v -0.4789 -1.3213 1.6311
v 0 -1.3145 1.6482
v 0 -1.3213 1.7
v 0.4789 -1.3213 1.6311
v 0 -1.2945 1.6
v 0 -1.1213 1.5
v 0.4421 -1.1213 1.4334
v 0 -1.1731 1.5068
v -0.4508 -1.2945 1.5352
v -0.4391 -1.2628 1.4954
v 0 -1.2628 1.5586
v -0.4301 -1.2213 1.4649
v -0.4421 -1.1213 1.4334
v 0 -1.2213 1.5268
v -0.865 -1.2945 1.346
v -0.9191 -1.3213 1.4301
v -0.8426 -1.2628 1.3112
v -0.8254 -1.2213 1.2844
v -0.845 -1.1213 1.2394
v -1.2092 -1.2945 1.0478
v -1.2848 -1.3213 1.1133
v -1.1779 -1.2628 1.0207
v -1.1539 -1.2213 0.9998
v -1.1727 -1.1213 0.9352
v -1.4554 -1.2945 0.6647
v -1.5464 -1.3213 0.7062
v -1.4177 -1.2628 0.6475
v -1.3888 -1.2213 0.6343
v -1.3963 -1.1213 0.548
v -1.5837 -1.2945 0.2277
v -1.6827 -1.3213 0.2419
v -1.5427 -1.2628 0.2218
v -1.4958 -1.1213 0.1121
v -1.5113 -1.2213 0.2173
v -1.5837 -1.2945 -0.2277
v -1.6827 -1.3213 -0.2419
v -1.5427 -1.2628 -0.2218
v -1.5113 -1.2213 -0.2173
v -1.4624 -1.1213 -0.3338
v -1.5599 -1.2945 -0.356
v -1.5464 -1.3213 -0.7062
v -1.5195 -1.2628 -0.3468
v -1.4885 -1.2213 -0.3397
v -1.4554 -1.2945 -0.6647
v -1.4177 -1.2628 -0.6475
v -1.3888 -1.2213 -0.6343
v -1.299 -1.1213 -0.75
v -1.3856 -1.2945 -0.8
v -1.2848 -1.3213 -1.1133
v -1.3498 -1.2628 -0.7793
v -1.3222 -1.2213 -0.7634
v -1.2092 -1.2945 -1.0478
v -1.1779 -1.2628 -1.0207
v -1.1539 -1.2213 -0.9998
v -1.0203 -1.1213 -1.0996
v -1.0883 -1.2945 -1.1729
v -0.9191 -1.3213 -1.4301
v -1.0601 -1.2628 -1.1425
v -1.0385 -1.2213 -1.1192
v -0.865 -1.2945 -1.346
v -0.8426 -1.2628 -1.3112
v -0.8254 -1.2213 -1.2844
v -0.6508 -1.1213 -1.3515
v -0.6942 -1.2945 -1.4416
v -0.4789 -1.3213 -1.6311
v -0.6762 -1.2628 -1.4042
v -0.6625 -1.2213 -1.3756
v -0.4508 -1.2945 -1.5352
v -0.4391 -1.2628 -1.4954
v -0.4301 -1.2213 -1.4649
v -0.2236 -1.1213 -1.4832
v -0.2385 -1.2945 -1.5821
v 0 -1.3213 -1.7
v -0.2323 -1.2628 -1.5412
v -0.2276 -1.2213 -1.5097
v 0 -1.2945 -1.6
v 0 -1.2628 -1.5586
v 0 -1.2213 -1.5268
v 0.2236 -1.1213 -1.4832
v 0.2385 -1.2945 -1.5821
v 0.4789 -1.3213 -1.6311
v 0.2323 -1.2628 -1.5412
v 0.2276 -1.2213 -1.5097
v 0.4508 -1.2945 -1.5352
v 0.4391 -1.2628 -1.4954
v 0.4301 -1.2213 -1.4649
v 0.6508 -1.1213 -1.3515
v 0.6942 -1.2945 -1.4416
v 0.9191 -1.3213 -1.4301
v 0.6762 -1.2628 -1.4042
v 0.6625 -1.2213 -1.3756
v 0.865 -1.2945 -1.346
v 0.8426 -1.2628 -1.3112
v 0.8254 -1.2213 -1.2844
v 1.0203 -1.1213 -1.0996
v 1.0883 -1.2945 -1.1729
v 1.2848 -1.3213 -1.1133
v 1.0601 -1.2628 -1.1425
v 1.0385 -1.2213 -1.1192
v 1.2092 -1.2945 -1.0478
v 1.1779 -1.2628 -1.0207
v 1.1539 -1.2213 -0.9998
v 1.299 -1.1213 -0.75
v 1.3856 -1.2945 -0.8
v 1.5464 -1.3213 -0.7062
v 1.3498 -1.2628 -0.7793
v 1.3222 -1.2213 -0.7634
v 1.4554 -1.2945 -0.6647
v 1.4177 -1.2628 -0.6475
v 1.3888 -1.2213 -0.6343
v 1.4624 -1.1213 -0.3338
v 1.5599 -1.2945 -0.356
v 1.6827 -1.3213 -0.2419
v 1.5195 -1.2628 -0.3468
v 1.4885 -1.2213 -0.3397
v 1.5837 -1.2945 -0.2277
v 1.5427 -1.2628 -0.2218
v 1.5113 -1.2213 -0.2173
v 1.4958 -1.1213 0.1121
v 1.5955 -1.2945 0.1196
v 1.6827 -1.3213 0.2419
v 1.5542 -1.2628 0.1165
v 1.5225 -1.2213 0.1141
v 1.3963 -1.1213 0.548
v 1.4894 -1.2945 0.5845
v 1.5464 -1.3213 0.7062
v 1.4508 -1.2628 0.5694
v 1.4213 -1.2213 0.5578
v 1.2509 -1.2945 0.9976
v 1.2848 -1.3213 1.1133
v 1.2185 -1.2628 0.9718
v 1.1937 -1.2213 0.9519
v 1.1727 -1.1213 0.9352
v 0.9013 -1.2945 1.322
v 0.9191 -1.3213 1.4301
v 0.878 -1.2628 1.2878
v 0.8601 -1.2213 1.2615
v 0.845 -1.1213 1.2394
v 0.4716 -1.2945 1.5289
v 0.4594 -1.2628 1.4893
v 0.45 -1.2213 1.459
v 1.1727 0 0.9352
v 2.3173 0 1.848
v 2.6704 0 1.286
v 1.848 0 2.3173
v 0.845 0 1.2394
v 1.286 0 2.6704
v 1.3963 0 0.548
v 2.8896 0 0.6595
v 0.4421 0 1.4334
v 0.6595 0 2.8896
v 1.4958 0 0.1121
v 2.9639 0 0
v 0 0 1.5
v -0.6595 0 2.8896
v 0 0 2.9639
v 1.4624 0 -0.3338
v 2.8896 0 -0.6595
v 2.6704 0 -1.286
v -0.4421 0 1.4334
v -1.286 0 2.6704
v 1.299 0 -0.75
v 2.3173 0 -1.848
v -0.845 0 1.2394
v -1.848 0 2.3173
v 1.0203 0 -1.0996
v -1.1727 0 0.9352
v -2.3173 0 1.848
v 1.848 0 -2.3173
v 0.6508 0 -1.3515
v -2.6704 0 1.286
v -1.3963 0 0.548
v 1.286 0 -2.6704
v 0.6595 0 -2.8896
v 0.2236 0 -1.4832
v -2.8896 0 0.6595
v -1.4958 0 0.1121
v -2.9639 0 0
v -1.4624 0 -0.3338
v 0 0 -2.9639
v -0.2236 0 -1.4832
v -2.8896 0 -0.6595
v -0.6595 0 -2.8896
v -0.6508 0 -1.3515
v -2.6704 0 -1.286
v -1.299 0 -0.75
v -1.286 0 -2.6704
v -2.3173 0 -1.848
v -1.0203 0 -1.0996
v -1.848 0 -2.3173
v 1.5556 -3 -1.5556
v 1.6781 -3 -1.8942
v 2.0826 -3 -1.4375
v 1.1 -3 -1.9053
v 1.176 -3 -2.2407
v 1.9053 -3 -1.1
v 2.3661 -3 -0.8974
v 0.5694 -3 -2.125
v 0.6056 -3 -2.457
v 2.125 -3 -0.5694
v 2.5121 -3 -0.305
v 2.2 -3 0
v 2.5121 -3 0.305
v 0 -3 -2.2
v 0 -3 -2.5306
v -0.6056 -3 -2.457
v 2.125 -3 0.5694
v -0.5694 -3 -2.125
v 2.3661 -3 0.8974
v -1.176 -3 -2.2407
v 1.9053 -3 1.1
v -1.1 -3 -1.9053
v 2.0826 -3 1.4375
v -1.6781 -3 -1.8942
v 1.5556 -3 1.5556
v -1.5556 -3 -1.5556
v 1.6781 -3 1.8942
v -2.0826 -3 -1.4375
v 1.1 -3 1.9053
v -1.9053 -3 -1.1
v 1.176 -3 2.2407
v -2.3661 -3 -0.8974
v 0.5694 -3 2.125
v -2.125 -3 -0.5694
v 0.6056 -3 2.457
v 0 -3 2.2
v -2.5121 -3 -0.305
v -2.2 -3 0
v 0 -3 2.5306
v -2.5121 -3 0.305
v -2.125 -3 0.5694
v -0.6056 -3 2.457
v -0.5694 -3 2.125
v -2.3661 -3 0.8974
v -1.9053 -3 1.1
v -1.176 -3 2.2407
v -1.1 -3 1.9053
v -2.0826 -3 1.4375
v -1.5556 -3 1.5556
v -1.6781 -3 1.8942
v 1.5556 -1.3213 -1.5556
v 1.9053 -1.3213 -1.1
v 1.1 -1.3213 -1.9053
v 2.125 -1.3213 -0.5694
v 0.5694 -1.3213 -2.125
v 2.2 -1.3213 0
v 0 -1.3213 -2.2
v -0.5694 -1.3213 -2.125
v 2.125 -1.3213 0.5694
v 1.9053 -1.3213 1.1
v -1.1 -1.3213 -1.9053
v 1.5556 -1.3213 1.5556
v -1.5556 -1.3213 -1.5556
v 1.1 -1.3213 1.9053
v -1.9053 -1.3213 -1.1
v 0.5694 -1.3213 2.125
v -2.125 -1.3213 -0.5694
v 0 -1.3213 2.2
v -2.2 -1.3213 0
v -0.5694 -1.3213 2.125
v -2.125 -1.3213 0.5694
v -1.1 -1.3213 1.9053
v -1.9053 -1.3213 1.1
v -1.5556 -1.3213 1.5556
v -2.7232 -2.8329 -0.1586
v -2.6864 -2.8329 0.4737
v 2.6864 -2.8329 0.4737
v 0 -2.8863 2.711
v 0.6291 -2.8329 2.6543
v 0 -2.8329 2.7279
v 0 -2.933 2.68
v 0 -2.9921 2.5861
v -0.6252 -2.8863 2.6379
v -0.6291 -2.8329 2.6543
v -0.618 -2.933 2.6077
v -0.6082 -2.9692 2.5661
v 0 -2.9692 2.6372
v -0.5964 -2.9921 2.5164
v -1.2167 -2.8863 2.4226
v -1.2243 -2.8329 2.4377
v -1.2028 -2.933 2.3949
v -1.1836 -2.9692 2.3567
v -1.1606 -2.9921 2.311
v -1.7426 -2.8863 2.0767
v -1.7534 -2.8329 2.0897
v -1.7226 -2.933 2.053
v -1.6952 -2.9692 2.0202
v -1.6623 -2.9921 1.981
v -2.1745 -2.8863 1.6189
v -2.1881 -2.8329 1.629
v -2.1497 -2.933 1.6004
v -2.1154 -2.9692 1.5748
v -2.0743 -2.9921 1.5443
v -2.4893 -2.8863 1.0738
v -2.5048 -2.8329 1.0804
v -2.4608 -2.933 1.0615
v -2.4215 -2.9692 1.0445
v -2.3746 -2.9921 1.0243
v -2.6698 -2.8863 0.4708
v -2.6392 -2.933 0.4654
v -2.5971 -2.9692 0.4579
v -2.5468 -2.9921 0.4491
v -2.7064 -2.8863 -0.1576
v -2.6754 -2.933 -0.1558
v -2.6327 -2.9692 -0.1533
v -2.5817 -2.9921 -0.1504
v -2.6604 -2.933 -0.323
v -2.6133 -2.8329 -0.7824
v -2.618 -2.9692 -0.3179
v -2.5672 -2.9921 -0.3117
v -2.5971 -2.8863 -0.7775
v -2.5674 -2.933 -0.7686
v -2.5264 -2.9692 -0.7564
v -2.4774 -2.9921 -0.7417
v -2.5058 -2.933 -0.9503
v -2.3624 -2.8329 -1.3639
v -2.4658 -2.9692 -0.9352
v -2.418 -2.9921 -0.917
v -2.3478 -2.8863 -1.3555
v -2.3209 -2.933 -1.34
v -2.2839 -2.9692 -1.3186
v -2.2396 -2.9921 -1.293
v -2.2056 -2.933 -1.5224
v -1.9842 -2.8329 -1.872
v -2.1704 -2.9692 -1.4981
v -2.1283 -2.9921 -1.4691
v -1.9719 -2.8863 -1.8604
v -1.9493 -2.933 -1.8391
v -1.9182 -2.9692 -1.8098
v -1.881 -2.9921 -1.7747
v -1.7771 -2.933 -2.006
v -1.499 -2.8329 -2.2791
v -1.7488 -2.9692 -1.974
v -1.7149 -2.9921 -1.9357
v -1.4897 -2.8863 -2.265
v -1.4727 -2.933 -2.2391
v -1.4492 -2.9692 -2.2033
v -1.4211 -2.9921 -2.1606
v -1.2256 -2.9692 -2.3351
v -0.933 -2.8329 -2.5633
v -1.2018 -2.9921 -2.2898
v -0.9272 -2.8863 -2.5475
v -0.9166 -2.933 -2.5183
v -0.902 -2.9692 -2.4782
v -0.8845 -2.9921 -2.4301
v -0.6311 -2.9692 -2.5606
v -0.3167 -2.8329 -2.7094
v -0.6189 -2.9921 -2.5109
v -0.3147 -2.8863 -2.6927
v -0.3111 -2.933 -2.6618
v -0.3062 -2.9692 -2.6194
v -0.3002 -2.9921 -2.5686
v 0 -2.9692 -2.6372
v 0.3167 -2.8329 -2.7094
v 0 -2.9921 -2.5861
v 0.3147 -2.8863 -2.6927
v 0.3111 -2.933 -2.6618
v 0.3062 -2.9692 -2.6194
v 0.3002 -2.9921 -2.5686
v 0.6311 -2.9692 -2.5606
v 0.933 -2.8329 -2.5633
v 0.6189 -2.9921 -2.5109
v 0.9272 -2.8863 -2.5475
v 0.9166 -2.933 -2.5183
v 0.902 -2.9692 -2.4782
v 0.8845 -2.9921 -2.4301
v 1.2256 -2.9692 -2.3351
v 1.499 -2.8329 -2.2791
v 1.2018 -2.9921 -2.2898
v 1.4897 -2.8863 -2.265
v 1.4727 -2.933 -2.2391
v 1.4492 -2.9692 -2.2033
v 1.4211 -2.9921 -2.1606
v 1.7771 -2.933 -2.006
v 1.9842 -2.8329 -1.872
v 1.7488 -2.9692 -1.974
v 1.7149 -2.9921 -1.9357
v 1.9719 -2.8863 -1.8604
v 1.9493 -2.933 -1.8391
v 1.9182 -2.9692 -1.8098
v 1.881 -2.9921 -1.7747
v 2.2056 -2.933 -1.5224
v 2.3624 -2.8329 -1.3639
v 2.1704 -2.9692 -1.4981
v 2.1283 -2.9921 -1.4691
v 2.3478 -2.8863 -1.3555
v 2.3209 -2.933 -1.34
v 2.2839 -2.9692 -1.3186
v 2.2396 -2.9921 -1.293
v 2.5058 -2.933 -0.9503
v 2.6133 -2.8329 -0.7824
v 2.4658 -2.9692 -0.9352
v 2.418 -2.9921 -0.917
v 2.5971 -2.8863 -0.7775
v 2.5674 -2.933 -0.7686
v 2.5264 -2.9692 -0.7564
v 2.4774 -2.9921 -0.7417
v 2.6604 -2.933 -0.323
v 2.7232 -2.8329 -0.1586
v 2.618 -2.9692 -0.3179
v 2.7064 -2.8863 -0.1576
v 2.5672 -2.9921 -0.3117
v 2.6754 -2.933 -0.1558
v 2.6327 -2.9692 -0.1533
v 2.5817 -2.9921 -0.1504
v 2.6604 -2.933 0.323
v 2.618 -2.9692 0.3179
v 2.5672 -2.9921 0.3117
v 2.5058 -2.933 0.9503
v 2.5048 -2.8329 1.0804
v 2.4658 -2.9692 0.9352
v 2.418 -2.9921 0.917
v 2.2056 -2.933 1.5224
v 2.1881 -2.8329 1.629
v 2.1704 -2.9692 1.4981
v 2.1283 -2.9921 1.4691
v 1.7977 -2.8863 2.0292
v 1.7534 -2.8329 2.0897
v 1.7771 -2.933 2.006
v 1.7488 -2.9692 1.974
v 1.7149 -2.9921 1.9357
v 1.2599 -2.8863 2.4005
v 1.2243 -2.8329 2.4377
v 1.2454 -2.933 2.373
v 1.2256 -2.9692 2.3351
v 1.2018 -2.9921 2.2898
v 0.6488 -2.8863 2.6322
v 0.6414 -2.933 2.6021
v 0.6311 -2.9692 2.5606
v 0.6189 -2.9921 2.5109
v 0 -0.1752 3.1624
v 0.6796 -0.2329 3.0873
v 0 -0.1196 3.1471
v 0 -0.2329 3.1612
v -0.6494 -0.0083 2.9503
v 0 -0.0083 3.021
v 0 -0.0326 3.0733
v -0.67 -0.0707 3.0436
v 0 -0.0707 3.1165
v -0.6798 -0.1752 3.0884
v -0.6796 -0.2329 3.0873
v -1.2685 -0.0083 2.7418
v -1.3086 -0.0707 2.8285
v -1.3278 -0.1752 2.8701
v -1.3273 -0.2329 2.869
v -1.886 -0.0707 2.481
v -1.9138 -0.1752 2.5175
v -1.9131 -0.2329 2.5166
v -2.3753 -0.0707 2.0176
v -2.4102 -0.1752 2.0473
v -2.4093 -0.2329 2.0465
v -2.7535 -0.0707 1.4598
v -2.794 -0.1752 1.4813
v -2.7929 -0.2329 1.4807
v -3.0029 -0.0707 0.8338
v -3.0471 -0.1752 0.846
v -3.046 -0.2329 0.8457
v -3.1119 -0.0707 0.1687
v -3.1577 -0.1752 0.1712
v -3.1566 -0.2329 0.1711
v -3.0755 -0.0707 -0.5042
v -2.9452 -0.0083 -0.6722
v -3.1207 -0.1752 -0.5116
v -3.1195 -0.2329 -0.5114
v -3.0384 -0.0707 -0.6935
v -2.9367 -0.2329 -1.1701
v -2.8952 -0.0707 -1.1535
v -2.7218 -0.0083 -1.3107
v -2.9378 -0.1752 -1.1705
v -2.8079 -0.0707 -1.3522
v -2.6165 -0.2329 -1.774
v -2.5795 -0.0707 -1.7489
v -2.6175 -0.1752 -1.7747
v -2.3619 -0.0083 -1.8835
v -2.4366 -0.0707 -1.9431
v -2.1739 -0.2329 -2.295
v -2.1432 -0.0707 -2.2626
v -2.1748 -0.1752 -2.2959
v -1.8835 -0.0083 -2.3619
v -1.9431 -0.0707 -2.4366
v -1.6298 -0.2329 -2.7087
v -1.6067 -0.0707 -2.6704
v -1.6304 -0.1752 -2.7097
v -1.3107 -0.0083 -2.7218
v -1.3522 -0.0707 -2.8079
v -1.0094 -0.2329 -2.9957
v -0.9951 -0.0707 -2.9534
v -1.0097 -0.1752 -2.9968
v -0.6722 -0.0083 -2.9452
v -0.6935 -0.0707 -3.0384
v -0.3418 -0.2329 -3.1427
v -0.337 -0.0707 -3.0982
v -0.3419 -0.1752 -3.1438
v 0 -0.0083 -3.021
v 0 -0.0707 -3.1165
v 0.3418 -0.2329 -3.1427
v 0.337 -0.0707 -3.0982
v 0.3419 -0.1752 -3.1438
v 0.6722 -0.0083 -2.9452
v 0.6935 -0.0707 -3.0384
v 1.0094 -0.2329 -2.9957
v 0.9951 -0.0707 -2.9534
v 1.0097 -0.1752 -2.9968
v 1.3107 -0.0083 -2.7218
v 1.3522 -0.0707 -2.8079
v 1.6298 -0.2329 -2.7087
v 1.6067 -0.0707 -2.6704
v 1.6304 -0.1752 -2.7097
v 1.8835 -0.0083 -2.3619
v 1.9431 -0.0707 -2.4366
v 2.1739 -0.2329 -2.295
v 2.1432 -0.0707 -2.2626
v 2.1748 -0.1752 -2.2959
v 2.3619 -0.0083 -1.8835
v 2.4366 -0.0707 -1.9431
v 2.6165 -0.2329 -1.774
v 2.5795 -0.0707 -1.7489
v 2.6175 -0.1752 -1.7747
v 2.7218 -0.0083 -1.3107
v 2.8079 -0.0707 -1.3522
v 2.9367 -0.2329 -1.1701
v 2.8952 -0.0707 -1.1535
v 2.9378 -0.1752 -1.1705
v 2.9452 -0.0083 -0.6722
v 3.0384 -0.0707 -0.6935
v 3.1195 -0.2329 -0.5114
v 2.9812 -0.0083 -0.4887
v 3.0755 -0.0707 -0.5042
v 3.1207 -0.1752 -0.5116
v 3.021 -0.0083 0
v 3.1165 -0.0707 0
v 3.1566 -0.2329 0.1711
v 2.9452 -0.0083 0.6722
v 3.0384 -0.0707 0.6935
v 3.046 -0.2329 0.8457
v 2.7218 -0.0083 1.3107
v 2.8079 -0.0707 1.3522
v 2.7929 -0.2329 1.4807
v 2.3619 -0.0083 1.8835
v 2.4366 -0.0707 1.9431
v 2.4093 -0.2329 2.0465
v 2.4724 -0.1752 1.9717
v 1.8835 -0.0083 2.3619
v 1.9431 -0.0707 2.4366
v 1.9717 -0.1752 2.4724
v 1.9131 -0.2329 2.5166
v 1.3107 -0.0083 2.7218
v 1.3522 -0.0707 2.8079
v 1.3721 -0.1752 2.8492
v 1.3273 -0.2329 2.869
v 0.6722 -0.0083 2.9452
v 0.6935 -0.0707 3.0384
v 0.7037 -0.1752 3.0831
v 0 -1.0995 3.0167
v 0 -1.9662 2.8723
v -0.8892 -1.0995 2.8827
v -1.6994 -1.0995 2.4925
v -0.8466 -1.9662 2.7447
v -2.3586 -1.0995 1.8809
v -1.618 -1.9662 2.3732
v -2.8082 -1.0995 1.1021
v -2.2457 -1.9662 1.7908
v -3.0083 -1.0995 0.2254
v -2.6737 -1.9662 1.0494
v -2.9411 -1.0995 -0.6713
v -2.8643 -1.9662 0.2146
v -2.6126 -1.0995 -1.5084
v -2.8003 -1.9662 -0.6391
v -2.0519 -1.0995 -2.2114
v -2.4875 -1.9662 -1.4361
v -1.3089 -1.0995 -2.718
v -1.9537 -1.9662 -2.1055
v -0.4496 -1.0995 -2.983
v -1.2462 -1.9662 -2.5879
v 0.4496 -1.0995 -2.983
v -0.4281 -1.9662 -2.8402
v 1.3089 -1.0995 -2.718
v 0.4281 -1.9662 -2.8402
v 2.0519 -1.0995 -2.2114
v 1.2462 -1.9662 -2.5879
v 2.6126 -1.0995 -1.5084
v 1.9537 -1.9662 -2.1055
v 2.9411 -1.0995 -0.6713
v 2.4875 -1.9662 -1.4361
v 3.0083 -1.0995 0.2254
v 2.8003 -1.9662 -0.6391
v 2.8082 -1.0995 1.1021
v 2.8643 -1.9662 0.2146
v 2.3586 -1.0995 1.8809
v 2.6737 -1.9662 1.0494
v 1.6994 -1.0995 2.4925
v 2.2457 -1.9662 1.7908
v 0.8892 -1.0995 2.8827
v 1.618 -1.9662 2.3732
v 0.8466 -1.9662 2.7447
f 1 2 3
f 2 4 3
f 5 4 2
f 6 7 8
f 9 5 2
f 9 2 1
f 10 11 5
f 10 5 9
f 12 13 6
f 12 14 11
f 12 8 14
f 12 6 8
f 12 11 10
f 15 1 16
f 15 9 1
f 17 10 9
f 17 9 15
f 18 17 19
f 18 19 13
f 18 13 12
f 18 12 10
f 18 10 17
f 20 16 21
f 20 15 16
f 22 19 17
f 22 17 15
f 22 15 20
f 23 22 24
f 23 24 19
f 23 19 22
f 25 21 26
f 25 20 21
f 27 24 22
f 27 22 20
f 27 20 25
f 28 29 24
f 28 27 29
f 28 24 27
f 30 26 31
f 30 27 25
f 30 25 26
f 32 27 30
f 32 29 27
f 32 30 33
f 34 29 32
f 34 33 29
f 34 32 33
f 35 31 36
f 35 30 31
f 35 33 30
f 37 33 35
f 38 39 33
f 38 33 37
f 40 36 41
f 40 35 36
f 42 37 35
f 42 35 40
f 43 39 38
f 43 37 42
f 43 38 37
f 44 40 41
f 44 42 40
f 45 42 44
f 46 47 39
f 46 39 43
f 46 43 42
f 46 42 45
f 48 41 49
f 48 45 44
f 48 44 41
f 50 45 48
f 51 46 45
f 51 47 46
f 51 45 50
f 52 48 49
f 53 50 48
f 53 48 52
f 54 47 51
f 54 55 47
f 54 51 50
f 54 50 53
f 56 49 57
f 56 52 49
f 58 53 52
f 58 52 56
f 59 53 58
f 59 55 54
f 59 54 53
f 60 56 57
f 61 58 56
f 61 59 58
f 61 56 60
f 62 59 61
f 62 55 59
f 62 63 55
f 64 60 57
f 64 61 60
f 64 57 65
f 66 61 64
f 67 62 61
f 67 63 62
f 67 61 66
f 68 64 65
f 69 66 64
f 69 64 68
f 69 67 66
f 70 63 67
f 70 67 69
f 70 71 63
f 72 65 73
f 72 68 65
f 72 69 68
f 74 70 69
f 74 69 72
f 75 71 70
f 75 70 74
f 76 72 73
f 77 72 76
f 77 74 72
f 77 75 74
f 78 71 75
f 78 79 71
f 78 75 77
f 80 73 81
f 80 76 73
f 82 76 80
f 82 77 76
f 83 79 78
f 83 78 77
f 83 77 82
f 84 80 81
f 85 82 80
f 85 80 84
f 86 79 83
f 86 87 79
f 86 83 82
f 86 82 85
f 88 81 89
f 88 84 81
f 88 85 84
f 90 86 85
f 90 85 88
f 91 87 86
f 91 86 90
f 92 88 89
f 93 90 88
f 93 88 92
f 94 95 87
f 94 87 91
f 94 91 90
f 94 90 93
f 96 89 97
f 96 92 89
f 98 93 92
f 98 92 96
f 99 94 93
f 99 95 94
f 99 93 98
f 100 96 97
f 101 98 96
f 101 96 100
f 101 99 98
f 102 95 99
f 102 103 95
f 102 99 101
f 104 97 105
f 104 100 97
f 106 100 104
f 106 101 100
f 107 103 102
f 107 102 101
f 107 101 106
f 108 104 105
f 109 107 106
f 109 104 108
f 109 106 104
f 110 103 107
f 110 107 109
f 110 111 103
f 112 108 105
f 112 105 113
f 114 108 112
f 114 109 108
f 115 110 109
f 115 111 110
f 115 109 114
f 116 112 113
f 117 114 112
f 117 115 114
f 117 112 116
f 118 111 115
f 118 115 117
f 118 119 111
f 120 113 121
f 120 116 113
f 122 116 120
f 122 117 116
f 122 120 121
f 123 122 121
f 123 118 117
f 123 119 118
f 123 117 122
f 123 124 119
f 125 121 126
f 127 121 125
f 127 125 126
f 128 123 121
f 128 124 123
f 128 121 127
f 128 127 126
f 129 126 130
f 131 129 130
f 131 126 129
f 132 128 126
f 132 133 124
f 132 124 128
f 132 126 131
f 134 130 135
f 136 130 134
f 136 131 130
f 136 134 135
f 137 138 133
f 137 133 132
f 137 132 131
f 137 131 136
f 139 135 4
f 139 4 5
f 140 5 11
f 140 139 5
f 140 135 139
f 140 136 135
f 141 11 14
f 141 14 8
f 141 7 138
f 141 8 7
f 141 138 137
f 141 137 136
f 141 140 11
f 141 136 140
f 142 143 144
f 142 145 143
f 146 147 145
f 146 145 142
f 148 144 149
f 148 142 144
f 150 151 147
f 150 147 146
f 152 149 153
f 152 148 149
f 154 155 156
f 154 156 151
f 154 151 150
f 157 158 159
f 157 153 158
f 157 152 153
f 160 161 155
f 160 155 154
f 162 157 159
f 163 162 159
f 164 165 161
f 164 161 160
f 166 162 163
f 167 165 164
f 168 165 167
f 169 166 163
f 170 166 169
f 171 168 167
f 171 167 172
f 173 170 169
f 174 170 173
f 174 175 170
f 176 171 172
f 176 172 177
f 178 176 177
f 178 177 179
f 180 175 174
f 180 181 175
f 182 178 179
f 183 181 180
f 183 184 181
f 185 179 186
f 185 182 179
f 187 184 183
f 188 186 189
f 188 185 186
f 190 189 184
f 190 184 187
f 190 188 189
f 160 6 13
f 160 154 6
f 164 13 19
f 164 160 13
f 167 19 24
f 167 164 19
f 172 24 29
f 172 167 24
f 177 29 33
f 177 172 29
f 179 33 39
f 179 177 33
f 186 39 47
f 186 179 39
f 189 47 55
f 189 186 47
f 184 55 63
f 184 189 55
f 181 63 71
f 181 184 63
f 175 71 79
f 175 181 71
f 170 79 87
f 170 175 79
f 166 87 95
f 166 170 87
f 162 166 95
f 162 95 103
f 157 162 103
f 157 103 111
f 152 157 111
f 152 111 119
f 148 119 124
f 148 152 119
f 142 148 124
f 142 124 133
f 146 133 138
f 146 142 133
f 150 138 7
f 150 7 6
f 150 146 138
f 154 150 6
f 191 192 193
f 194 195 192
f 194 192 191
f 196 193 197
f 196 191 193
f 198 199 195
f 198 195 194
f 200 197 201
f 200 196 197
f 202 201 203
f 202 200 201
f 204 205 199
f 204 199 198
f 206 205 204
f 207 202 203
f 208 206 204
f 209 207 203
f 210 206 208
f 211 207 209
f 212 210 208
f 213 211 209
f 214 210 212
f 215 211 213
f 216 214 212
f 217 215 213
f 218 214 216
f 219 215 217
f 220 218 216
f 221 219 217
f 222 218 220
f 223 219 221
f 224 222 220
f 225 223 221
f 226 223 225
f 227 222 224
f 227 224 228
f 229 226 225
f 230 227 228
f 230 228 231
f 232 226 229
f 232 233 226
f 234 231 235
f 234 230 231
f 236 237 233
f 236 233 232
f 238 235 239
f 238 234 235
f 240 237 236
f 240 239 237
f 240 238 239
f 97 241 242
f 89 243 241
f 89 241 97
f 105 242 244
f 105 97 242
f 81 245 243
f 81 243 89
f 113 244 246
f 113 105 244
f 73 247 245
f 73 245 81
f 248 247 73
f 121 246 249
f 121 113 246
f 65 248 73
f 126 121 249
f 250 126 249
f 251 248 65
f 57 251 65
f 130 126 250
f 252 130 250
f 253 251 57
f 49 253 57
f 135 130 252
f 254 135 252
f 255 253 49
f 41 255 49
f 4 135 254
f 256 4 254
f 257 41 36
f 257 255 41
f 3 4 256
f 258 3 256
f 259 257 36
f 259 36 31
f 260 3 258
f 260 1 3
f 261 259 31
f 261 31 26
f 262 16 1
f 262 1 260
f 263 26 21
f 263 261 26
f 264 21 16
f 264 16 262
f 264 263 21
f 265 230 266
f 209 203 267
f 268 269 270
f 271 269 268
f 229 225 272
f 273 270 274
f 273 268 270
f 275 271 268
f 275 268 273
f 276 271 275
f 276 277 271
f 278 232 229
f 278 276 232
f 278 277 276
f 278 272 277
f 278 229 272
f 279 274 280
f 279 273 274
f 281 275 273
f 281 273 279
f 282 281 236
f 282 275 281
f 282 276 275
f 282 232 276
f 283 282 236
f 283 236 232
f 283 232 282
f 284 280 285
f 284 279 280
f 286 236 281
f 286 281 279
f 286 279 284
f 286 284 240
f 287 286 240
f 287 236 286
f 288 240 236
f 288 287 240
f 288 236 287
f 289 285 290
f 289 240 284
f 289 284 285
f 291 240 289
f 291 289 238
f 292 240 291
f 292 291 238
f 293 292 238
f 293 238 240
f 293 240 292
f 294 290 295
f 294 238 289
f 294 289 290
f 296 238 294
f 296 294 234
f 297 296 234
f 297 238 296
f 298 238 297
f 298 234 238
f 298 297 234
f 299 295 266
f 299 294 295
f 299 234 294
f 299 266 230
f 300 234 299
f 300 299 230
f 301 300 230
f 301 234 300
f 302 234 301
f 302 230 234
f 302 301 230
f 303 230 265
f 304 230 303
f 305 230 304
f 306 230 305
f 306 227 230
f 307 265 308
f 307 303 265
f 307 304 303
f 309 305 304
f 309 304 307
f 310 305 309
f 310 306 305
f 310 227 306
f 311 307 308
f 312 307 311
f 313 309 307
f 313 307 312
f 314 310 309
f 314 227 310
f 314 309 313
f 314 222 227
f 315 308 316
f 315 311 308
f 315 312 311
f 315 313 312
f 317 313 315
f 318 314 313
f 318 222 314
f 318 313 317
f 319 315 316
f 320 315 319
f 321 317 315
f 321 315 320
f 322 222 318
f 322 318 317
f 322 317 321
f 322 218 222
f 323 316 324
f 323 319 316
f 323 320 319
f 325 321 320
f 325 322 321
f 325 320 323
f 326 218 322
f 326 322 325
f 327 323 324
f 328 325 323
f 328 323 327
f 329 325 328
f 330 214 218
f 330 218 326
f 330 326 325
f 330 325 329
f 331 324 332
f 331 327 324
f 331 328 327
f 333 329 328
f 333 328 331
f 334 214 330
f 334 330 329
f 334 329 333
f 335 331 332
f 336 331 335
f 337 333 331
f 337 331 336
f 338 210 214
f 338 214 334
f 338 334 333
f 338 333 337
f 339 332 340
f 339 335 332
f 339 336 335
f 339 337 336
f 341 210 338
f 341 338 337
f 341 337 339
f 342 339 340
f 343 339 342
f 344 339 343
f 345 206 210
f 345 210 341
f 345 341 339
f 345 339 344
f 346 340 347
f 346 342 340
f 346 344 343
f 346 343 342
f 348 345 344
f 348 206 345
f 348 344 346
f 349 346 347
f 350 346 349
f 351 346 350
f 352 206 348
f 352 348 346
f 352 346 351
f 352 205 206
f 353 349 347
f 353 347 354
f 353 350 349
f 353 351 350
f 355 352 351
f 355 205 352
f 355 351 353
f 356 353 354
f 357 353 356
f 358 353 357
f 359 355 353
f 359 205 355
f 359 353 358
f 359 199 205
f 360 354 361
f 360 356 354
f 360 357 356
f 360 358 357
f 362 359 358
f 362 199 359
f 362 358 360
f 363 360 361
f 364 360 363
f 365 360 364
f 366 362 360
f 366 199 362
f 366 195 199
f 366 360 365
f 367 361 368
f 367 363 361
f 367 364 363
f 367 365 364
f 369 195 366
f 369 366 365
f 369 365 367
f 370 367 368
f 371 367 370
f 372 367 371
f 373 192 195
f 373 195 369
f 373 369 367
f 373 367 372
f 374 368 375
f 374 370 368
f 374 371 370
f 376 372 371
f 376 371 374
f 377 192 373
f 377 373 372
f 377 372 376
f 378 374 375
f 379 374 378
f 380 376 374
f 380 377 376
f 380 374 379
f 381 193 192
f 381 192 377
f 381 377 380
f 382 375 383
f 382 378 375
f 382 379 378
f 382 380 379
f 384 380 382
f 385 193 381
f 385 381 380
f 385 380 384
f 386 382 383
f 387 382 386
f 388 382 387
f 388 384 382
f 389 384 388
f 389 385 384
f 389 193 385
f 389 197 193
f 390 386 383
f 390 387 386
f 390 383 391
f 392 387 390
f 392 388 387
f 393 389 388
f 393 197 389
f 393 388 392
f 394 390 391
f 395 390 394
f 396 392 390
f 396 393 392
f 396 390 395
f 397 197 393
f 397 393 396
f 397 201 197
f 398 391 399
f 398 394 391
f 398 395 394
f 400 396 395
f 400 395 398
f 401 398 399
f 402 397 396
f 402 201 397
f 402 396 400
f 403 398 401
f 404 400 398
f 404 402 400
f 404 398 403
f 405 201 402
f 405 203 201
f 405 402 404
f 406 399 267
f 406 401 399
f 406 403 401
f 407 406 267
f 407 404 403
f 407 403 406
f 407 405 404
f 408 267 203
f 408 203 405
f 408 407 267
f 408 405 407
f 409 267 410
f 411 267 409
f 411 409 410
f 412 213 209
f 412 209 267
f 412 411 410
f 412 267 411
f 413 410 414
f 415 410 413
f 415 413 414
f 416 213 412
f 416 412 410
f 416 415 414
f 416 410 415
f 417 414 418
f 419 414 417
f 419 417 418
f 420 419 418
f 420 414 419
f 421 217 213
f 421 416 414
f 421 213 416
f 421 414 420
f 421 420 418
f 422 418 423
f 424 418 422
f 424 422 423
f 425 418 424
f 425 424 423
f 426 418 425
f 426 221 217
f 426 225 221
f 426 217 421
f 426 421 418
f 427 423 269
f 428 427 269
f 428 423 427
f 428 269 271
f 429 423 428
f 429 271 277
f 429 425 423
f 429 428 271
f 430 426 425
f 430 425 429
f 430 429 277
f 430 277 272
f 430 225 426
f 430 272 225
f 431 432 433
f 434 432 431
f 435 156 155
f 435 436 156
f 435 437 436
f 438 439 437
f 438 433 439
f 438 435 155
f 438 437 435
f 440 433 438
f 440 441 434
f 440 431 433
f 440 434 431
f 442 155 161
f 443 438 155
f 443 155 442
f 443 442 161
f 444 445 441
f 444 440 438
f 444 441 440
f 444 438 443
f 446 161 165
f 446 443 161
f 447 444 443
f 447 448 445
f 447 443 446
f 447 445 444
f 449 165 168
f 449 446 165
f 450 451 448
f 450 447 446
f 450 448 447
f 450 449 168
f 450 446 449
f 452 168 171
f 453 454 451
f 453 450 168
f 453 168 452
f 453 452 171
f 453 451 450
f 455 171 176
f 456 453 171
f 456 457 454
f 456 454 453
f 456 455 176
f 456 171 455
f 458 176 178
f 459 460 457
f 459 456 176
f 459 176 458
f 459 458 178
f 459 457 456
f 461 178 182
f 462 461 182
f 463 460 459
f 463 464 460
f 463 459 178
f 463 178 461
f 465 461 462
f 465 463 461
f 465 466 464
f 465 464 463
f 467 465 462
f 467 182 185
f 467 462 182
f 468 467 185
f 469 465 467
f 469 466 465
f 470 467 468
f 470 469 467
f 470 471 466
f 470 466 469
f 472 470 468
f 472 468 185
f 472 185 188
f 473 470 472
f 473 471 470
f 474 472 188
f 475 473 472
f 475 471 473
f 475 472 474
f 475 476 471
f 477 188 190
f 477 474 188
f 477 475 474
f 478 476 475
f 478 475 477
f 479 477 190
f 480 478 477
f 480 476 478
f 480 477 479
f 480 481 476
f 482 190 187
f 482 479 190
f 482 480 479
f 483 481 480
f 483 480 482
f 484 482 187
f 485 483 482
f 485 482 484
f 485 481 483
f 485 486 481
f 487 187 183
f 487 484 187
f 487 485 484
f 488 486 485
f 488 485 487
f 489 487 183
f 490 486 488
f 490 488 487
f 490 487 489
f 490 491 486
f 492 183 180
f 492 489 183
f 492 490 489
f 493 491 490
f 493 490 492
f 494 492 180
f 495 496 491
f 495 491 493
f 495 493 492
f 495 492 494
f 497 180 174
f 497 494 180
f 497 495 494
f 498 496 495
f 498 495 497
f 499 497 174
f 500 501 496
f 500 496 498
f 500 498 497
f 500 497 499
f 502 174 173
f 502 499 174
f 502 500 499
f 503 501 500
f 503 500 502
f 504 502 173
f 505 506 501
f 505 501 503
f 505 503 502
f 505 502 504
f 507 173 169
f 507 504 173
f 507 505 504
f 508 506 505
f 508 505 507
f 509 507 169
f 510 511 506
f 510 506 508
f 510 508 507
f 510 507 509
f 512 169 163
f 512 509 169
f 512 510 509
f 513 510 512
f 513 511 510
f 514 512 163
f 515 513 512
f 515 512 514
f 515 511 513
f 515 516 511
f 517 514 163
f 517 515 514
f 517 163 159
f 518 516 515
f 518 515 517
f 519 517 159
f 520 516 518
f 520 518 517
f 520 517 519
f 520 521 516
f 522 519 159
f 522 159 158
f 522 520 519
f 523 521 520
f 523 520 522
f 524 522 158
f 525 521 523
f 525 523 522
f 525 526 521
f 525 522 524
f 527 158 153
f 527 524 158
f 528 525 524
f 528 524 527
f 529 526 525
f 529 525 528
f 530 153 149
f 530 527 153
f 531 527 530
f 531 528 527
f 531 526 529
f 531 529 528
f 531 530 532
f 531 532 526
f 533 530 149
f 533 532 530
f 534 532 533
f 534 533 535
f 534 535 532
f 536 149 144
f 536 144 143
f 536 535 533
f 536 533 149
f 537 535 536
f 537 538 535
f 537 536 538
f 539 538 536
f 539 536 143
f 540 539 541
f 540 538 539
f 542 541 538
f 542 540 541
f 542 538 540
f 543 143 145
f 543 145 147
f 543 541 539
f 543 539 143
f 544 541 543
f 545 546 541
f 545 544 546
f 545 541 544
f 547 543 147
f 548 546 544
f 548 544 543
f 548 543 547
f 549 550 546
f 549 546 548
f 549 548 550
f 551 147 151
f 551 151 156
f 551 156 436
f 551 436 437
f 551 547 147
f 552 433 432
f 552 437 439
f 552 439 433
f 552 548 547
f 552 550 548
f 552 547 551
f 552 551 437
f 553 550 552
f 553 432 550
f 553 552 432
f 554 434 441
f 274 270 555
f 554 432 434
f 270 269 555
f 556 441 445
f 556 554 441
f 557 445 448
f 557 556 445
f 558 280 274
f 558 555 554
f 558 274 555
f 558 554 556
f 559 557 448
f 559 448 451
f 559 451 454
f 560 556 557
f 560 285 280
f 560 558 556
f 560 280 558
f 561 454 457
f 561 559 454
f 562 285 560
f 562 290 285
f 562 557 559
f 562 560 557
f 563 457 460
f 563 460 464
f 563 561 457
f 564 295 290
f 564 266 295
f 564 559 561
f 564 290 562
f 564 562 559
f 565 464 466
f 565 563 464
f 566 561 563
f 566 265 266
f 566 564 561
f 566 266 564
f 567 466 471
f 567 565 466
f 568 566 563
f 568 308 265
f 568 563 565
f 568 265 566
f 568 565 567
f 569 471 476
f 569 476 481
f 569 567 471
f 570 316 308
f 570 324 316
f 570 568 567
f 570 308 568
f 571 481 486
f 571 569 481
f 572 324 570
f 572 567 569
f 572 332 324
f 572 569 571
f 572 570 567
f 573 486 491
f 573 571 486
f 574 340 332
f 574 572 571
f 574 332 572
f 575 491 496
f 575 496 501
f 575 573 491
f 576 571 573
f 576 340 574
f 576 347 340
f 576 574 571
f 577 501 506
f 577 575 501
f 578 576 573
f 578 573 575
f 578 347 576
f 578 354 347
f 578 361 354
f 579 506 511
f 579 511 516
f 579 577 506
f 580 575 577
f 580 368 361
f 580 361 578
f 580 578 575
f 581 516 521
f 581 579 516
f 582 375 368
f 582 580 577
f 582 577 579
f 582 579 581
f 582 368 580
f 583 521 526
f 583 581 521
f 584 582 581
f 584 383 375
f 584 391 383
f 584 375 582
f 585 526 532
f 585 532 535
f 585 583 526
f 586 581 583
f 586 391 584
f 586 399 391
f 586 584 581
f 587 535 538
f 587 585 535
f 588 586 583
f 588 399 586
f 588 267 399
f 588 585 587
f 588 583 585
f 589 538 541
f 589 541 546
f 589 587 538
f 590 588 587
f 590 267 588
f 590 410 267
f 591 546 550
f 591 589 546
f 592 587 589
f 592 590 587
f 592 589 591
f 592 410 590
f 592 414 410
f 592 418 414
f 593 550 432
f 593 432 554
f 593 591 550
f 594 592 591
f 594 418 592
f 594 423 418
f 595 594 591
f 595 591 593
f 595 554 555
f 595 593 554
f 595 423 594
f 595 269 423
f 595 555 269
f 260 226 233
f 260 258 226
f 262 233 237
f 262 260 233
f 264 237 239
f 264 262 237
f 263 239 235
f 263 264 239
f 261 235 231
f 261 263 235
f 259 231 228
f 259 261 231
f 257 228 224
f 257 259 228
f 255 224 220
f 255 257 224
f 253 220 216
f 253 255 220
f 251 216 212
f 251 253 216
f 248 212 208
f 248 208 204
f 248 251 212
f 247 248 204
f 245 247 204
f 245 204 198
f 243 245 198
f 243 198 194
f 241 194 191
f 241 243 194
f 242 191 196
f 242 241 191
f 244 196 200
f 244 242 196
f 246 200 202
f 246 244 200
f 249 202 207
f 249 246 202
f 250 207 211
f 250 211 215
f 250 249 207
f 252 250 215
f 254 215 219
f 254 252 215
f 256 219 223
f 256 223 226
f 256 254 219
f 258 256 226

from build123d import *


with BuildPart() as part:
    # Sketch1 → Revolve1 (revolve)
    with BuildSketch(Plane.XY, mode=Mode.PRIVATE) as revolve1_sk:
        with BuildLine():
            Line((1.5, 0), (2.963907916, 0))
            ThreePointArc((2.963907916, 0), (3.116511912, -0.070725021), (3.1611867, -0.232879797))
            Line((3.1611867, -0.232879797), (2.727853367, -2.832879797))
            ThreePointArc((2.727853367, -2.832879797), (2.659849562, -2.952603996), (2.530574582, -3))
            Line((2.530574582, -3), (2.2, -3))
            Line((2.2, -3), (2.2, -1.32133537))
            Line((2.2, -1.32133537), (1.7, -1.32133537))
            ThreePointArc((1.7, -1.32133537), (1.558578644, -1.262756726), (1.5, -1.12133537))
            Line((1.5, -1.12133537), (1.5, 0))
        make_face()
    revolve(revolve1_sk.sketch.rotate(Axis((0, 1.955447774, 0), (0, -1, 0)), 90), axis=Axis((0, 1.955447774, 0), (0, -1, 0)))


solid = part.part
